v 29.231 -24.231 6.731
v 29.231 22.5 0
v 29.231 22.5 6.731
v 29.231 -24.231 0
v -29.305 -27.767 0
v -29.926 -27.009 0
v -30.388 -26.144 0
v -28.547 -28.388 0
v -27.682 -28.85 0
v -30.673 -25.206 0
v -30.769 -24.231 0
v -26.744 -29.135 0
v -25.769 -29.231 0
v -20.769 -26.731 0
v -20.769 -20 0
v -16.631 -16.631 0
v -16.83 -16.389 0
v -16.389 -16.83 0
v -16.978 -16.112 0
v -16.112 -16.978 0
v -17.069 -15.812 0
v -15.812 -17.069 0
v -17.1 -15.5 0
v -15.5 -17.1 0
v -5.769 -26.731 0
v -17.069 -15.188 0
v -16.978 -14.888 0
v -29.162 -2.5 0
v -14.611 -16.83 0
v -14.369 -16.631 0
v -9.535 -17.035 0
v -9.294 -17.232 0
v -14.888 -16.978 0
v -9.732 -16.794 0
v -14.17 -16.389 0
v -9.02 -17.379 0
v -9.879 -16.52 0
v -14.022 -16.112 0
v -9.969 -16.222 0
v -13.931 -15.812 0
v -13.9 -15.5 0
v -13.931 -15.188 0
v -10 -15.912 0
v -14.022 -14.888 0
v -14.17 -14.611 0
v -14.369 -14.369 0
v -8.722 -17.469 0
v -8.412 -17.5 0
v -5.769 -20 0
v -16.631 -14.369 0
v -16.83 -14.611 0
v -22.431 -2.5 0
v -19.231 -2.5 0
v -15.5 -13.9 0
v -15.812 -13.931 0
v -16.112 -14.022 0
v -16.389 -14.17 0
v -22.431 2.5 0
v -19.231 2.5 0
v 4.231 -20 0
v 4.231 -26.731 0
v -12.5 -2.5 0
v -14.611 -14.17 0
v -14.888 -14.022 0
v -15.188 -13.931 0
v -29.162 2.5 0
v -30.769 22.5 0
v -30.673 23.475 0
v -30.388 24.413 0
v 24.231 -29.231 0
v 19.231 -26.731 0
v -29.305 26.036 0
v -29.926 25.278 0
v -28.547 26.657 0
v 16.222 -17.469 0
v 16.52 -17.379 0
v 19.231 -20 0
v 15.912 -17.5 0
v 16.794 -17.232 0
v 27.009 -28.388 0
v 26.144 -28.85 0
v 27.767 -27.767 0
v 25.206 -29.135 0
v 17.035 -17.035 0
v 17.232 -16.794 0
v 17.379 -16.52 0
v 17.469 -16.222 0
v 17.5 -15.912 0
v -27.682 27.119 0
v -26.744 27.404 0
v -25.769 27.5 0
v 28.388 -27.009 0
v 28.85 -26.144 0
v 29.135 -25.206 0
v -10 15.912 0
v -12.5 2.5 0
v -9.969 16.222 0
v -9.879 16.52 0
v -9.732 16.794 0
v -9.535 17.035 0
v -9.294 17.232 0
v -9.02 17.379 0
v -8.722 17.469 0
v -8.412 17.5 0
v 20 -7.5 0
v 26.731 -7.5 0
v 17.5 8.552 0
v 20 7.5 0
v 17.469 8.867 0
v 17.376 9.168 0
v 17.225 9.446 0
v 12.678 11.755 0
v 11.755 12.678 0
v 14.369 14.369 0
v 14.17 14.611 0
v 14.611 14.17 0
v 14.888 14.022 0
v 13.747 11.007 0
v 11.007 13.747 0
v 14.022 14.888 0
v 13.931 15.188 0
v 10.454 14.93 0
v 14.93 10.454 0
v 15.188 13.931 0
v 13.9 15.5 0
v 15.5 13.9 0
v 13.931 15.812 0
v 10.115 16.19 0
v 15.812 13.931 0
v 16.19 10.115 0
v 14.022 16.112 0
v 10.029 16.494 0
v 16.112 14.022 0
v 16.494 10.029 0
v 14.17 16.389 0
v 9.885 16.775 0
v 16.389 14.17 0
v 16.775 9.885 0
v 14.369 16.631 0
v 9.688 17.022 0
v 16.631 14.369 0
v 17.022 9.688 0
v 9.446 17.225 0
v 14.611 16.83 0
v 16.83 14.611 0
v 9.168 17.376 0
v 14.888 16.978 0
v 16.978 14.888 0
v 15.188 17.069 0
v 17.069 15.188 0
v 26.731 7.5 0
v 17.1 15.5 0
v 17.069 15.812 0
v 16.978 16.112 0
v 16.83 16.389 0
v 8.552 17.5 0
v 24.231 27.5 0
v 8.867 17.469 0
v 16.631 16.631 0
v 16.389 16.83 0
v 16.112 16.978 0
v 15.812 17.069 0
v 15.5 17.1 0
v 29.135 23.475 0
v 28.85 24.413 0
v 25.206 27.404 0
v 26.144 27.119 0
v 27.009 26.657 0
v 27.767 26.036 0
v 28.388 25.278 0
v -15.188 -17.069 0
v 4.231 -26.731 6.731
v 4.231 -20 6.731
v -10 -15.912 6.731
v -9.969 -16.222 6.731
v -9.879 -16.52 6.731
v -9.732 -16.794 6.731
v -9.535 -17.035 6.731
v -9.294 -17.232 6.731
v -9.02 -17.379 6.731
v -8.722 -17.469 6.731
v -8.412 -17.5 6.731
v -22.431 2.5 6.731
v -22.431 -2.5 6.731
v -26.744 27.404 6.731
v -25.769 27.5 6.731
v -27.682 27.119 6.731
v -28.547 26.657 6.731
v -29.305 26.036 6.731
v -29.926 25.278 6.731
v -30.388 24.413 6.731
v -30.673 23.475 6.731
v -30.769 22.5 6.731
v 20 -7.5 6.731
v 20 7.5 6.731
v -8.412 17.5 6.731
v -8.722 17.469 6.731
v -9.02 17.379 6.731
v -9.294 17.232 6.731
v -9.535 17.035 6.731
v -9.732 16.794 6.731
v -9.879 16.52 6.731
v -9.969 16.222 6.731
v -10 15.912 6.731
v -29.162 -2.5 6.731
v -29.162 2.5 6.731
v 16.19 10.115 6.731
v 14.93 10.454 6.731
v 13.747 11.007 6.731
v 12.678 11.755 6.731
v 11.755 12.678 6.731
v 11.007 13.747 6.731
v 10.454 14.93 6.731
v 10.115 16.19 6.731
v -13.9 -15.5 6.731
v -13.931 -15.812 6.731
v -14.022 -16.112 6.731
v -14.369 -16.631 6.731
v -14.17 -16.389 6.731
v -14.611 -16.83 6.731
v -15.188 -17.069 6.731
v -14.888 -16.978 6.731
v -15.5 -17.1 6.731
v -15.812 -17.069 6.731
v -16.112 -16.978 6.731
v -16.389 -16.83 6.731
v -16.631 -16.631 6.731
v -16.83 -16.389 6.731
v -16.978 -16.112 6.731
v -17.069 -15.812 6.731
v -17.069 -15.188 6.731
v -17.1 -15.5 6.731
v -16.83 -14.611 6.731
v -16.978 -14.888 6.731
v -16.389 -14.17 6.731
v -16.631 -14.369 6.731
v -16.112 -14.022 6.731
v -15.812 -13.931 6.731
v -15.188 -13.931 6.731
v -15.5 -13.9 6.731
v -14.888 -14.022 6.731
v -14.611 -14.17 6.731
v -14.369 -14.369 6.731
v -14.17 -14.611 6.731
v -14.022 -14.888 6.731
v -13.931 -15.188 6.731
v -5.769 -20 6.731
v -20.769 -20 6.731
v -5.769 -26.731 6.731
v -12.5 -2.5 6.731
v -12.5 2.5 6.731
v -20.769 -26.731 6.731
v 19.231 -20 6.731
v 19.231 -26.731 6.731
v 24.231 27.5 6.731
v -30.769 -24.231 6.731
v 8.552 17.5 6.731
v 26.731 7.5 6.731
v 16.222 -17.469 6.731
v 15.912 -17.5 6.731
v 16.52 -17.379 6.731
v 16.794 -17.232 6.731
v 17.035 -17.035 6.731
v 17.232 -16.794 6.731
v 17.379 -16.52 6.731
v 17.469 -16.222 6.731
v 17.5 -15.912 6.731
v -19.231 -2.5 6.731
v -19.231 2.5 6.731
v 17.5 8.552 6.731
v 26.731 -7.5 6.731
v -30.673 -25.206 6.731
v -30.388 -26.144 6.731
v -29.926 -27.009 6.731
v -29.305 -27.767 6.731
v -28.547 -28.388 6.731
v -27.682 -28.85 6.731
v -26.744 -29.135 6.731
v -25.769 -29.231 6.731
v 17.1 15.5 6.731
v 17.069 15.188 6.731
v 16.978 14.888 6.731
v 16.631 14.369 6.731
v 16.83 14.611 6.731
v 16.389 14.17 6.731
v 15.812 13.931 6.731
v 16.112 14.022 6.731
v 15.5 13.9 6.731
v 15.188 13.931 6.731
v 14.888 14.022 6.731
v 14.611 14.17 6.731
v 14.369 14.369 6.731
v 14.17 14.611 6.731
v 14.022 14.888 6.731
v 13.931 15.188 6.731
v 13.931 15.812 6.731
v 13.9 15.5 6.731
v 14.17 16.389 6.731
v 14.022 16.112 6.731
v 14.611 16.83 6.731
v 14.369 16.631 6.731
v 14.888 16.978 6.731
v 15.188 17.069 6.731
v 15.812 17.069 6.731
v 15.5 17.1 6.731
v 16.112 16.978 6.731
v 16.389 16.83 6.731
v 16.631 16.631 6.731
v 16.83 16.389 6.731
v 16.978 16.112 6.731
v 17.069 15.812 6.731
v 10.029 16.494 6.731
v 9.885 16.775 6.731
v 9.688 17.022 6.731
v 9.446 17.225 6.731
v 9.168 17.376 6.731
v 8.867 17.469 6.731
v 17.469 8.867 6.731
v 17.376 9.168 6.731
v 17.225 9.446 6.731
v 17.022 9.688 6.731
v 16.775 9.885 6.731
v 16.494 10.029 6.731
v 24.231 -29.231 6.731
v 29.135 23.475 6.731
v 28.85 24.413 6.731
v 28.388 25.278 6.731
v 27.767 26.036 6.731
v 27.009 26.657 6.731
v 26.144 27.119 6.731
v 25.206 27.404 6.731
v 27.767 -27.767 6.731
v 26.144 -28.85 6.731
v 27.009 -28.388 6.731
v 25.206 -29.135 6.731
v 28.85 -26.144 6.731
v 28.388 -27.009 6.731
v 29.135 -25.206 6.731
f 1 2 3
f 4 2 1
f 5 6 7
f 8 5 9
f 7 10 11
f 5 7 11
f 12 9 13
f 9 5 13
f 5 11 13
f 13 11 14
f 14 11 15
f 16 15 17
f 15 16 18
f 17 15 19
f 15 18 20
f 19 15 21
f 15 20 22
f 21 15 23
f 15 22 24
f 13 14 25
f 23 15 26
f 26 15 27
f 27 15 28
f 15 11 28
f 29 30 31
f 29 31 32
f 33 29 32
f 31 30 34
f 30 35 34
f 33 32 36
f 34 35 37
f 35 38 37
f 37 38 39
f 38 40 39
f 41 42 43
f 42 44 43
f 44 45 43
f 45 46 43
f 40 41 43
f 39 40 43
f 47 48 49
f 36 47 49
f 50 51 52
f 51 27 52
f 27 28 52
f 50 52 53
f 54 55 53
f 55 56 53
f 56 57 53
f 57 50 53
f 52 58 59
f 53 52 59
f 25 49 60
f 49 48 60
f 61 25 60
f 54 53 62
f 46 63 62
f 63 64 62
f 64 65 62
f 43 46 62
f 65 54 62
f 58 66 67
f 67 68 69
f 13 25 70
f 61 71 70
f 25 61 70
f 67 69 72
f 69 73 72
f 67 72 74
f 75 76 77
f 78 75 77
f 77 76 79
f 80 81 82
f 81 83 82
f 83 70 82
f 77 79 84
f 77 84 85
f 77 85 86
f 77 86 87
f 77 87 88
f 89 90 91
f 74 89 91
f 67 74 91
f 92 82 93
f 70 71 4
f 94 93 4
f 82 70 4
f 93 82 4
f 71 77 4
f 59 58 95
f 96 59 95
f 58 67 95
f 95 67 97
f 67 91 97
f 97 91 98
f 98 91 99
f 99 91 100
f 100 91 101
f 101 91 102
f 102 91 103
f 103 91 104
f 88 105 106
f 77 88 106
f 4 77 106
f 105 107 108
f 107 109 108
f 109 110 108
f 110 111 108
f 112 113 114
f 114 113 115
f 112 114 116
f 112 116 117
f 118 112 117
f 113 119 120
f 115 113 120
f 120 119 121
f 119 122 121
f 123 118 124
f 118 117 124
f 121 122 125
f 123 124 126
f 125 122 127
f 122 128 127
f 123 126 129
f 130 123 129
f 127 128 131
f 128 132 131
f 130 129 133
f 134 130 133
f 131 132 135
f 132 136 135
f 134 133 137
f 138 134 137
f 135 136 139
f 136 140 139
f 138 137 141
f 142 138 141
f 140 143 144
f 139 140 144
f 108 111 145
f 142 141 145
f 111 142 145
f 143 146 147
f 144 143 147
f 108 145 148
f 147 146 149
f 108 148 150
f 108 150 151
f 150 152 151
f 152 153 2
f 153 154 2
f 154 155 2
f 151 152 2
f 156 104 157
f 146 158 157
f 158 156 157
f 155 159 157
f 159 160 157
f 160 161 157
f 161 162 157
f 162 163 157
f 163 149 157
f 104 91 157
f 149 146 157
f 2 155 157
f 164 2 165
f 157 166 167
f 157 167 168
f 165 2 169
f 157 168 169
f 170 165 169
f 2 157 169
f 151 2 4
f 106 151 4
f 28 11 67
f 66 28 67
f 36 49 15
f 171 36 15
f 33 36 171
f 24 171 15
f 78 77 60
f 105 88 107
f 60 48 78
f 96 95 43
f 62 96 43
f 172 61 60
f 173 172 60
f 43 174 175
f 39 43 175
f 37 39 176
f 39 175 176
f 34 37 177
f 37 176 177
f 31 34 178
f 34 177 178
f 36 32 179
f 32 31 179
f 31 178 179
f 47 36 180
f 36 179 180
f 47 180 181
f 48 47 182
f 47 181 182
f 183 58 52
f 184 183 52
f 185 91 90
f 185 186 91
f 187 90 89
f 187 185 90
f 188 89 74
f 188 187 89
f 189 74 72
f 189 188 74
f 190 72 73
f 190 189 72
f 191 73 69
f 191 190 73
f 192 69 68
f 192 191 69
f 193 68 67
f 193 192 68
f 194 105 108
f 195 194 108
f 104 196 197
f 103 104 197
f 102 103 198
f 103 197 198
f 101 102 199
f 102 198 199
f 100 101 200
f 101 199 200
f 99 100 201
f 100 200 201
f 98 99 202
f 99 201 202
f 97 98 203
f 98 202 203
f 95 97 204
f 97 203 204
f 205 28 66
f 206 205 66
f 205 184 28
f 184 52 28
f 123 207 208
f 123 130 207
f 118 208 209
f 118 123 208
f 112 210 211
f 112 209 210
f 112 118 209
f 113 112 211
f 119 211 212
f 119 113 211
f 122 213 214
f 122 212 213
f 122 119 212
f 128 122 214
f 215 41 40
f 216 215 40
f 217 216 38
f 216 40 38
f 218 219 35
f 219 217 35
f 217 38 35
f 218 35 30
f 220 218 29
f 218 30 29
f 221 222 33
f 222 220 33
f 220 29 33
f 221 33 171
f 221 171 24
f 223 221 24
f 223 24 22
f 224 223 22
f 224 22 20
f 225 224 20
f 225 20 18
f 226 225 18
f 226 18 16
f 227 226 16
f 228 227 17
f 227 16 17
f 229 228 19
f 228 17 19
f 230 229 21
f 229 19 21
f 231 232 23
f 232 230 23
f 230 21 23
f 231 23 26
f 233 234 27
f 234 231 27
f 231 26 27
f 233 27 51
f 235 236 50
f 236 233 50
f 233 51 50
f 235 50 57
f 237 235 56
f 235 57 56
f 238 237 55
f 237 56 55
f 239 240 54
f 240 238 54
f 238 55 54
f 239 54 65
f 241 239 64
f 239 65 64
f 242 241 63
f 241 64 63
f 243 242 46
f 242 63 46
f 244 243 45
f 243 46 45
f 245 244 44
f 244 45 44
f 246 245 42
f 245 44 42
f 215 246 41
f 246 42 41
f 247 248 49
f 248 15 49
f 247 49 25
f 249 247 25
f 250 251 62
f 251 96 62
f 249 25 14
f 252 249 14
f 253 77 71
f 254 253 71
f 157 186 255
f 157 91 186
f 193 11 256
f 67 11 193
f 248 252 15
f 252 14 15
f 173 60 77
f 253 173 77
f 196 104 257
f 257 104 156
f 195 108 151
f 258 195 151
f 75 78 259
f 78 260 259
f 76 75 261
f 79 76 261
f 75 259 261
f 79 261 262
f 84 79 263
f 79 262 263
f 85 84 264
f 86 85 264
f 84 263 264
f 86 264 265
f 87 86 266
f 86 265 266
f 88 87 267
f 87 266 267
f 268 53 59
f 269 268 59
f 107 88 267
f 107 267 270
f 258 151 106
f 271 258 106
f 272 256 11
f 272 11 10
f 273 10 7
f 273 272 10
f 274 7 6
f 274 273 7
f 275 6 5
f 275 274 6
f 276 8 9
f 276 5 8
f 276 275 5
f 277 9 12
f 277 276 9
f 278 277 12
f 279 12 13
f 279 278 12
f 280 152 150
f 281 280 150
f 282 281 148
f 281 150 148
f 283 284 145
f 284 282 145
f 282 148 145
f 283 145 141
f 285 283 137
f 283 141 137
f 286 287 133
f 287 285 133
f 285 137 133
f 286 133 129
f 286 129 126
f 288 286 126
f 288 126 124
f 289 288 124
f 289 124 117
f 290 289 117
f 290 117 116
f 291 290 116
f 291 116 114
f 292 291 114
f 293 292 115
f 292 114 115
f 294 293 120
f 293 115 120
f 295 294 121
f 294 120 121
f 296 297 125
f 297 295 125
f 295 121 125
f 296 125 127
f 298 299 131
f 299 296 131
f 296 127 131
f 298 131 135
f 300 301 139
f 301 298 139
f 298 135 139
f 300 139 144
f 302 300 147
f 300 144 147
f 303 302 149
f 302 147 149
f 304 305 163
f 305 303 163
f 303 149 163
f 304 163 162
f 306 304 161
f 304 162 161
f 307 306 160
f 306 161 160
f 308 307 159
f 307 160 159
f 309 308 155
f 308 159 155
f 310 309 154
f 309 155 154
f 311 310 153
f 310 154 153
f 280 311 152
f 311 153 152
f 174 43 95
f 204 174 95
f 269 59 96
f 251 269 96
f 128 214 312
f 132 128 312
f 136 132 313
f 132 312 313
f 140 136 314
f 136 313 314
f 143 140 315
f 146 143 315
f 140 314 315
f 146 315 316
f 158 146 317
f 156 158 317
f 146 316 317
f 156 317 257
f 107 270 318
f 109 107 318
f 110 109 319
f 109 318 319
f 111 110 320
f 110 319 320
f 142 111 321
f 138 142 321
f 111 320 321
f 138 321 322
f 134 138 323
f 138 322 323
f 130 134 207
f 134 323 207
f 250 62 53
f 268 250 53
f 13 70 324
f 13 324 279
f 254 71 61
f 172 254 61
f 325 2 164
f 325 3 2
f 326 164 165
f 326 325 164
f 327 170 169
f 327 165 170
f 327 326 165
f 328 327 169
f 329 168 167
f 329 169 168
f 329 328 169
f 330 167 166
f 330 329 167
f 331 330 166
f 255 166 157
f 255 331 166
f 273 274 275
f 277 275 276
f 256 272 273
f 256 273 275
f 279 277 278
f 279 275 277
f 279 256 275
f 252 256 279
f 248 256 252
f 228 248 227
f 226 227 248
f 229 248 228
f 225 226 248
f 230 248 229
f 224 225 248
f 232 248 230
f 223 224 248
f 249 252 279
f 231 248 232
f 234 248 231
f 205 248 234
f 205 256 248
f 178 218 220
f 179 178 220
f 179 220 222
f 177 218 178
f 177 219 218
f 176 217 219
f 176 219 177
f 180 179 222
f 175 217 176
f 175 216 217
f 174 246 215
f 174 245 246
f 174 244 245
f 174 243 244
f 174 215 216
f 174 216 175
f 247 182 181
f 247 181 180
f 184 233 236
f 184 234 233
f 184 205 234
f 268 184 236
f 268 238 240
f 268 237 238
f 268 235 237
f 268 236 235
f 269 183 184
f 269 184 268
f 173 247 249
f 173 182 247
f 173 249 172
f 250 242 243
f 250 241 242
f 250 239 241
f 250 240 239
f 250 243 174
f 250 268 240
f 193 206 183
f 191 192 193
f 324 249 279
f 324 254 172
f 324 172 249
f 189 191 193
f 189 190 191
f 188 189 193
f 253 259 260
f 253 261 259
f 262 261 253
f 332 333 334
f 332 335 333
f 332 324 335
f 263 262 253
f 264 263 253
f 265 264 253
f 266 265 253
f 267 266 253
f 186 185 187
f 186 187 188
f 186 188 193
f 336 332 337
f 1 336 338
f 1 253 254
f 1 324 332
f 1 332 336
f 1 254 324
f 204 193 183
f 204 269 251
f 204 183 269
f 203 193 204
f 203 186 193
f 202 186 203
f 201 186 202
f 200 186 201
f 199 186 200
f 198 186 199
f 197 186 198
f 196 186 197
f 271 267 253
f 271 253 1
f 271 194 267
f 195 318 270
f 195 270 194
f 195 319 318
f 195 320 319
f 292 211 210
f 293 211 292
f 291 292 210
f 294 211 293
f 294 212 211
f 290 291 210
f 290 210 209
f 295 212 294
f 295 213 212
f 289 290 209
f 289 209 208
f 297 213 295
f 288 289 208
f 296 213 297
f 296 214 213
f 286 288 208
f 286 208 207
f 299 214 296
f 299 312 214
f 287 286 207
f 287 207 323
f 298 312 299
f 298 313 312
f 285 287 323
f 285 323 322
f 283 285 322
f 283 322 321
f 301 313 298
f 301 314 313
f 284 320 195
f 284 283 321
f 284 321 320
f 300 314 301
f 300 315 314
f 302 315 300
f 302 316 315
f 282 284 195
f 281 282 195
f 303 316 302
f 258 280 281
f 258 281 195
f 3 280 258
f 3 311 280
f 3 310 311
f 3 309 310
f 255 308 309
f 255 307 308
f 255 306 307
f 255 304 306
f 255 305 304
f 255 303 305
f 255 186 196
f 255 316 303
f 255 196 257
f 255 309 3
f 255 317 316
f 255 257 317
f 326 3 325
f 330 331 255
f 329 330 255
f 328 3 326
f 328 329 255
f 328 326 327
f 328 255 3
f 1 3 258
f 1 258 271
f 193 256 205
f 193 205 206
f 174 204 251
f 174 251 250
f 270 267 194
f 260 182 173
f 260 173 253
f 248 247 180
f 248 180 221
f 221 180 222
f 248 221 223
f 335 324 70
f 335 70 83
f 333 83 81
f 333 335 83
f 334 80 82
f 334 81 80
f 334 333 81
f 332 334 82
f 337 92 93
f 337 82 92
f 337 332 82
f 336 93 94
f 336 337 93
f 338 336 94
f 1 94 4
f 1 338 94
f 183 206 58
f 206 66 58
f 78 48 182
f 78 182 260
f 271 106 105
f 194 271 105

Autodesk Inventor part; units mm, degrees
ref_plane "YZ Plane" through (0, 0, 0) normal (1, 0, 0) x (0, 1, 0)
ref_plane "XZ Plane" through (0, 0, 0) normal (0, 1, 0) x (-1, 0, 0)
ref_plane "XY Plane" through (0, 0, 0) normal (0, 0, 1) x (1, 0, 0)
sketch "Sketch1" plane through (0, 0, 0) normal (0, 0, 1) x (1, 0, 0)
  circle A0 centre (0, 0) radius 2.5
  circle A1 centre (15.5, 15.5) radius 1.6
  line L0 (-19.231, 2.5) -> (-12.5, 2.5)
  line L1 (-12.5, 2.5) -> (-12.5, -2.5)
  line L2 (-12.5, -2.5) -> (-19.231, -2.5)
  line L3 (-19.231, -2.5) -> (-19.231, 2.5)
  line L4 (20, 7.5) -> (26.731, 7.5)
  line L5 (26.731, 7.5) -> (26.731, -7.5)
  line L6 (26.731, -7.5) -> (20, -7.5)
  line L7 (20, -7.5) -> (20, 7.5)
  line L8 (-30.769, 27.5) -> (29.231, 27.5)
  line L9 (29.231, 27.5) -> (29.231, -29.231)
  line L10 (29.231, -29.231) -> (-30.769, -29.231)
  line L11 (-30.769, -29.231) -> (-30.769, 27.5)
  line L12 (4.231, -20) -> (19.231, -20)
  line L13 (19.231, -20) -> (19.231, -26.731)
  line L14 (19.231, -26.731) -> (4.231, -26.731)
  line L15 (4.231, -26.731) -> (4.231, -20)
  line L16 (-29.162, 2.5) -> (-22.431, 2.5)
  line L17 (-22.431, 2.5) -> (-22.431, -2.5)
  line L18 (-22.431, -2.5) -> (-29.162, -2.5)
  line L19 (-29.162, -2.5) -> (-29.162, 2.5)
  line L20 (-20.769, -20) -> (-5.769, -20)
  line L21 (-5.769, -20) -> (-5.769, -26.731)
  line L22 (-5.769, -26.731) -> (-20.769, -26.731)
  line L23 (-20.769, -26.731) -> (-20.769, -20)
  line L24 (-10, -17.5) -> (-10, 17.5)
  line L25 (-10, 17.5) -> (10, 17.5)
  line L26 (-10, -17.5) -> (17.5, -17.5)
  line L27 (17.5, -17.5) -> (17.5, 10)
  arc A2 (10, 17.5) -> (17.5, 10) centre (17.5, 17.5) ccw
  line L28 (-10, -17.5) -> (-6, 0)
  line L29 (6, 0) -> (17.5, -17.5)
  arc A3 (6, 0) -> (-6, 0) centre (0, 0) ccw
  circle A4 centre (-15.5, -15.5) radius 1.6
  point P0 (-12.5, 0)
  point P1 (20, 0)
  dimension "d0" = 5
  dimension "d6" = 32.5
  dimension "d7" = 20
  dimension "d8" = 5
  dimension "d9" = 6.731
  dimension "d13" = 20
  dimension "d17" = 2.5
  dimension "d18" = 20
  dimension "d19" = 2.5
  dimension "d20" = 3.2
  dimension "d25" = 15
  dimension "d26" = 10
  dimension "d28" = 60
  dimension "d29" = 10
  dimension "d30" = 15.5
  dimension "d31" = 15.5
  dimension "d32" = 3.2
  dimension "d33" = 2.5
  dimension "d34" = 2.5
  dimension "d35" = 2.5
  dimension "d36" = 7.5
  dimension "d37" = 6
  dimension "d39" = 35
  dimension "d40" = 15.5
  dimension "d41" = 15.5
extrude "Extrusion2" add sketch "Sketch1" along normal blind 6.731 contours L8 L9 L10 L11
fillet "Fillet2" radius 5 4 edges at (29.231, 27.5, 3.3655) (29.231, -29.231, 3.3655) (-30.769, -29.231, 3.3655) (-30.769, 27.5, 3.3655)
fillet "Fillet2" radius 1.5875 5 edges at (-10, -17.5, 3.3655) (17.5, -17.5, 3.3655) (17.5, 10, 3.3655) (10, 17.5, 3.3655) (-10, 17.5, 3.3655)
equation "\"d9\" = THICKB"
equation "\"d13\" = d7"
equation "\"d29\" = d26"
equation "\"d30\" = d31"
equation "\"d40\" = d31"
equation "\"d41\" = d31"
equation "\"d22\" = THICKB"
equation "\"THICKA\" = 3.175"
equation "\"THICKB\" = 6.731"
equation "\"THICKC\" = 12.7"
equation "\"BALLDIA\" = 12"
equation "\"MAGDIA\" = 9.5"
properties part number "Air2D_Side_Face"
